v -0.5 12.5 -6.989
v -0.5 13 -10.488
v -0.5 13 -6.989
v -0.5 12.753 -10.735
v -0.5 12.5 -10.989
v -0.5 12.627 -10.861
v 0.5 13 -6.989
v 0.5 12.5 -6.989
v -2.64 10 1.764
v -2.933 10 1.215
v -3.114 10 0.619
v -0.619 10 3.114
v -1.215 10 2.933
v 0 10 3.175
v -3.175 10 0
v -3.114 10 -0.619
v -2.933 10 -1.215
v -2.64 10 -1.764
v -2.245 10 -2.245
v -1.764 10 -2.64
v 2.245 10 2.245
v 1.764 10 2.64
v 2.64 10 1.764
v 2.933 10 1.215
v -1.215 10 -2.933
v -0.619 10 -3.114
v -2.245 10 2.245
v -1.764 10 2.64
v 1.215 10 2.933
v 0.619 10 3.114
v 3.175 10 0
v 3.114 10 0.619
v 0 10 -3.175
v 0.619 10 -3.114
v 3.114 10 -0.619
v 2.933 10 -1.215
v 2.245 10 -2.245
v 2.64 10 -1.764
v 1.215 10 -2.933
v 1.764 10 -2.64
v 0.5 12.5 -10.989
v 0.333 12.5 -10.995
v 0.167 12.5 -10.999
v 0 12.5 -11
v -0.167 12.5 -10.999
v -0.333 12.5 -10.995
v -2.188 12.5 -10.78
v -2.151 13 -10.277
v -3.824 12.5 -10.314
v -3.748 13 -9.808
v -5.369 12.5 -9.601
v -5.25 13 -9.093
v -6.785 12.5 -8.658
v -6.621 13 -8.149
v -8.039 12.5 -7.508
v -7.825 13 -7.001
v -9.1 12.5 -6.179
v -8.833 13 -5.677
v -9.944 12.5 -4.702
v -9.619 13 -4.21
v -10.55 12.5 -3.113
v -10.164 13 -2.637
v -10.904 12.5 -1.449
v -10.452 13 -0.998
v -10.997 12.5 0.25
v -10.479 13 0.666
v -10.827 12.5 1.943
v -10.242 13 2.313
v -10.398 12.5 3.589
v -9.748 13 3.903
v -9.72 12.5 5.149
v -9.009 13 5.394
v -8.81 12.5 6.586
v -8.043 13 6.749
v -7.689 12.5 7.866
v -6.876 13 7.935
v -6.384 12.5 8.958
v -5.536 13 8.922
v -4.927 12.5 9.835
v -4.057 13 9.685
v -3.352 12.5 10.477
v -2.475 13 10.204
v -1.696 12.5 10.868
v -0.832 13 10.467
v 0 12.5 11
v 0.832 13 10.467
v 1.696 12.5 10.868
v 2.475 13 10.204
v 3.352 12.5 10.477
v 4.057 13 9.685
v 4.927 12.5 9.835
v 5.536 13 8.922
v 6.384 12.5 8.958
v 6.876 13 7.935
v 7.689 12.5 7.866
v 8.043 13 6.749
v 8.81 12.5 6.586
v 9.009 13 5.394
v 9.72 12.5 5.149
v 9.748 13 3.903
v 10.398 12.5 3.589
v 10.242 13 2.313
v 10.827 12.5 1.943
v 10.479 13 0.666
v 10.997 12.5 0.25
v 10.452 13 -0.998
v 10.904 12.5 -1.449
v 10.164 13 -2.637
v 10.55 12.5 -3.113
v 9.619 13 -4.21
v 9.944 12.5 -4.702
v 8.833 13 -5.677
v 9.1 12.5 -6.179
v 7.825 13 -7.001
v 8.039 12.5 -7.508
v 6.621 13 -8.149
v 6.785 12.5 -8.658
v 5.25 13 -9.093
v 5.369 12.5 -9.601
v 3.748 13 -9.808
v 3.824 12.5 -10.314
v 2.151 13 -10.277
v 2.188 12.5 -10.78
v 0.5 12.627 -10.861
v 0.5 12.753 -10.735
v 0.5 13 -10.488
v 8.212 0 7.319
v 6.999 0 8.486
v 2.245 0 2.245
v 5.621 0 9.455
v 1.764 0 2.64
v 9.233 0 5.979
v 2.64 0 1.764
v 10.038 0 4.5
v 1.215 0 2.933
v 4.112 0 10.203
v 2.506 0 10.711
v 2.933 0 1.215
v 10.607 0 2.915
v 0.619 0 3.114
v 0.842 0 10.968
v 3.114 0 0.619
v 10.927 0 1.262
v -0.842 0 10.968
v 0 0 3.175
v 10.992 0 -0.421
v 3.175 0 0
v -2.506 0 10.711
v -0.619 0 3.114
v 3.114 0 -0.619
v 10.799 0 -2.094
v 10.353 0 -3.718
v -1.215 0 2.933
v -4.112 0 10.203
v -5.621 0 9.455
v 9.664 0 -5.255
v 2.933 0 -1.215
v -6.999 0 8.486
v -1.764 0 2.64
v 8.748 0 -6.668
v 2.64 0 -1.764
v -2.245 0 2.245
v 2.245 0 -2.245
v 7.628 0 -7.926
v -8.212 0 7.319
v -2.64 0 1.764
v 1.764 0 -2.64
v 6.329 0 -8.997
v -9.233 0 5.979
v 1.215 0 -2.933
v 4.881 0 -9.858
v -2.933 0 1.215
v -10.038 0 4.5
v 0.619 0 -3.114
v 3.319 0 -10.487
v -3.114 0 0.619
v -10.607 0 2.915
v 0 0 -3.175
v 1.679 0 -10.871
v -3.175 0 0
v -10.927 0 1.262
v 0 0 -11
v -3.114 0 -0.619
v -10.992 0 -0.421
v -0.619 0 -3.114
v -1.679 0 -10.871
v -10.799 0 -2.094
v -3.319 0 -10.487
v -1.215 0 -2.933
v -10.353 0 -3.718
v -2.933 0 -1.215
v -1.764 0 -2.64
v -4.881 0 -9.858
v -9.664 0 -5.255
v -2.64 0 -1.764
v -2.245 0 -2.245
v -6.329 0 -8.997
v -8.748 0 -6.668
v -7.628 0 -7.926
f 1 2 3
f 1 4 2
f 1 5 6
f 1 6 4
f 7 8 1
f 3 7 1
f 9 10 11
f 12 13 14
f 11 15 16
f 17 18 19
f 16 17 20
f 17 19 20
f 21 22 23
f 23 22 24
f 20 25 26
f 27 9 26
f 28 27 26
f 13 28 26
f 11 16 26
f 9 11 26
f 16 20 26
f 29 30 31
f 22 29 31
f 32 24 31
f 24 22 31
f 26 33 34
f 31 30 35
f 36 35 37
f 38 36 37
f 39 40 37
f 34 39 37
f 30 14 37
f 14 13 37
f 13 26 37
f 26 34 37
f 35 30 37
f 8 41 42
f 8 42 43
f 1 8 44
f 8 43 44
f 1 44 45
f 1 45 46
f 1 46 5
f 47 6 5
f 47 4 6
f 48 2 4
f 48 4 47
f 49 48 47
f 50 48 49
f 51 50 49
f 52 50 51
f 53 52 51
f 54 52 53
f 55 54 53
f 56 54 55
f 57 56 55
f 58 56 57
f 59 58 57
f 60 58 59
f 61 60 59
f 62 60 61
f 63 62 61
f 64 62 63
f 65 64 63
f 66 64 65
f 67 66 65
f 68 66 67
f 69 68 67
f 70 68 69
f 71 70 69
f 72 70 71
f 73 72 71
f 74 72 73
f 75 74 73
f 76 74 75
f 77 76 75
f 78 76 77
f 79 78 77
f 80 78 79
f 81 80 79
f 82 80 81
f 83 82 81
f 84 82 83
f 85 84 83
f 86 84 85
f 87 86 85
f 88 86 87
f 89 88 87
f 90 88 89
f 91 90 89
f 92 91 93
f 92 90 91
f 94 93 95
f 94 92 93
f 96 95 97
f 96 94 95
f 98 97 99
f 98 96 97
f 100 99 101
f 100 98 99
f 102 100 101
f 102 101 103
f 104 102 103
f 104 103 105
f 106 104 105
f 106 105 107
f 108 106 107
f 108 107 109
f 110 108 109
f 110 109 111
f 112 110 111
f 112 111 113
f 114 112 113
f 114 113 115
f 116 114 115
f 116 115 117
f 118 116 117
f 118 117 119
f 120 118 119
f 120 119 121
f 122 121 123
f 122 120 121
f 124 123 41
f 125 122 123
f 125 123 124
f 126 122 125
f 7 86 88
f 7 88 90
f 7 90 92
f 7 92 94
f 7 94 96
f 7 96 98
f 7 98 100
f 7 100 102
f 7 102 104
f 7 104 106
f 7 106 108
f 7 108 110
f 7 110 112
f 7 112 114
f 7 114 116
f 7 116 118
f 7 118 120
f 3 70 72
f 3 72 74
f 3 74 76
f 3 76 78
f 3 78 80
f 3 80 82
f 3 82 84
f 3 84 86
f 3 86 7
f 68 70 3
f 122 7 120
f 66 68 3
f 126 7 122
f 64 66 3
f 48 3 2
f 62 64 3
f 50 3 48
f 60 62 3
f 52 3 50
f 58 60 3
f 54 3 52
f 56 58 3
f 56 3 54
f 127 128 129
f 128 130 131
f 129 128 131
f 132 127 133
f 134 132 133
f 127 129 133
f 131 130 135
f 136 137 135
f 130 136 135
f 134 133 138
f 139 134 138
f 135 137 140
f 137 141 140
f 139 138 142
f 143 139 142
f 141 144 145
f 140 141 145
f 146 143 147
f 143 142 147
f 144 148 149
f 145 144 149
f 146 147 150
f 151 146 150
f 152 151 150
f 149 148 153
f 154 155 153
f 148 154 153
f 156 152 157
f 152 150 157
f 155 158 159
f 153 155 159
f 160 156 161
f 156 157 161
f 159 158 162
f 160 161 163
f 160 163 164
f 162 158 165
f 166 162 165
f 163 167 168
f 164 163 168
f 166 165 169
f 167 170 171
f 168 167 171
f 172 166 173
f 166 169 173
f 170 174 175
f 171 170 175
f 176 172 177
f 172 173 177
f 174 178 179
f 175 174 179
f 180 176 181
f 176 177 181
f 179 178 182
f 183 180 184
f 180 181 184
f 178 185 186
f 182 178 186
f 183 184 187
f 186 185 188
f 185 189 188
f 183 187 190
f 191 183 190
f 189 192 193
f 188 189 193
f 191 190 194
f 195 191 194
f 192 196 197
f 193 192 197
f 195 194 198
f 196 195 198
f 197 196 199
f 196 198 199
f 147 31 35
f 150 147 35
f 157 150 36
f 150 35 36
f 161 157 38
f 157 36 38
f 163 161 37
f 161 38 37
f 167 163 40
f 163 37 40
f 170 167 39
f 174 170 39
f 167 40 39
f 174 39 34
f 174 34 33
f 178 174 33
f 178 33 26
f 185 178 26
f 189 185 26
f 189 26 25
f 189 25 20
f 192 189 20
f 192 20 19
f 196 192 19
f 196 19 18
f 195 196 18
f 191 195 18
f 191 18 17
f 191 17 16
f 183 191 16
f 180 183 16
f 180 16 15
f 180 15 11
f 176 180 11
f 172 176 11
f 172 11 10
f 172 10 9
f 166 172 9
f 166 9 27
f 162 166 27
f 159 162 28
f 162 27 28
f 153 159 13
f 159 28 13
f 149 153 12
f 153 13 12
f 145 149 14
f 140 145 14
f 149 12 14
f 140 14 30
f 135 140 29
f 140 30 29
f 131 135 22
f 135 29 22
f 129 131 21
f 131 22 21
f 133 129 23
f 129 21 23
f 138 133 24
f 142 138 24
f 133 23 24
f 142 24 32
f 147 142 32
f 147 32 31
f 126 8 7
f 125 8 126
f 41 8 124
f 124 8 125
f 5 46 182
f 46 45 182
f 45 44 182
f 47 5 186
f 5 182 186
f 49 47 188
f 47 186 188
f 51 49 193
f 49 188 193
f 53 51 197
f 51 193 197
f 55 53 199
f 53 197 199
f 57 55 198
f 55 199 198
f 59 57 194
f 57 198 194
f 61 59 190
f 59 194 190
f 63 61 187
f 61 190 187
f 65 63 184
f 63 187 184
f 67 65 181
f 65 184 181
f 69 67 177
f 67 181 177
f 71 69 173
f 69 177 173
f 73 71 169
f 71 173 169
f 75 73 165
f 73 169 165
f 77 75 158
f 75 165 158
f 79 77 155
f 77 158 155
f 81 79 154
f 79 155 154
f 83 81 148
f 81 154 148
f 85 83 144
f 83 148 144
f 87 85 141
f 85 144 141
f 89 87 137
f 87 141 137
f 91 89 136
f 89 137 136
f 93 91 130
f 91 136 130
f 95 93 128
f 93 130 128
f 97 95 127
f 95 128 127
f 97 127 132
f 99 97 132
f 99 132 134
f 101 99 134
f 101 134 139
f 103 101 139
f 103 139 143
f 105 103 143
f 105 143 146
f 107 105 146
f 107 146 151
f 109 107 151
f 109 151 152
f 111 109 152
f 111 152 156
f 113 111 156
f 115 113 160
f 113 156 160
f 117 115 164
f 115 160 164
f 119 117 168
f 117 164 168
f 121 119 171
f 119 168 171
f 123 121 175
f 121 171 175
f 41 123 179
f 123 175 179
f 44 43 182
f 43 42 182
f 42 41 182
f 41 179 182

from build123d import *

# Parameters (mm, degrees)
SKETCH1_R               = 11
BOSS_EXTRUDE1_DEPTH     = 13
HOLE1_D                 = 6.35
HOLE1_DEPTH             = 10
CUT_EXTRUDE2_DEPTH      = 21.273134933
CUT_EXTRUDE2_DEPTH_BACK = 0.5
CHAMFER1_SIZE           = 0.5


with BuildPart() as part:
    # Sketch1 → Boss-Extrude1 (new body)
    with BuildSketch(Plane(origin=(0, 0, 0), x_dir=(1, 0, 0), z_dir=(0, 1, 0))):
        with Locations(Location((0, 0, 0), (0, 0, 90))):
            Circle(SKETCH1_R)
    extrude(amount=BOSS_EXTRUDE1_DEPTH)

    # Hole1
    with Locations(Plane(origin=(0, 0, 0), x_dir=(-1, 0, 0), z_dir=(0, -1, 0))):
        with Locations((0, 0)):
            Hole(HOLE1_D / 2, depth=HOLE1_DEPTH)

    # Sketch5 → Cut-Extrude2 (cut, two sides: drawn at the far end of the back side and taken through both)
    with BuildSketch(Plane(origin=(0, 13, 0), x_dir=(1, 0, 0), z_dir=(0, 1, 0)).offset(-CUT_EXTRUDE2_DEPTH_BACK)):
        Polygon((0.5, 70.617246053), (0.5, 10.988630488), (0.5, 6.988630488), (-0.5, 6.988630488), (-0.5, 10.988630488), (-0.5, 70.617246053), (-0.5, 189.874477184), (0.5, 189.874477184), align=None)
    extrude(amount=CUT_EXTRUDE2_DEPTH + CUT_EXTRUDE2_DEPTH_BACK, mode=Mode.SUBTRACT)

    # Chamfer1
    chamfer1_edges = [part.edges().sort_by_distance(p)[0] for p in [
        (0, 13, 11),
    ]]
    chamfer(chamfer1_edges, length=CHAMFER1_SIZE)


solid = part.part
